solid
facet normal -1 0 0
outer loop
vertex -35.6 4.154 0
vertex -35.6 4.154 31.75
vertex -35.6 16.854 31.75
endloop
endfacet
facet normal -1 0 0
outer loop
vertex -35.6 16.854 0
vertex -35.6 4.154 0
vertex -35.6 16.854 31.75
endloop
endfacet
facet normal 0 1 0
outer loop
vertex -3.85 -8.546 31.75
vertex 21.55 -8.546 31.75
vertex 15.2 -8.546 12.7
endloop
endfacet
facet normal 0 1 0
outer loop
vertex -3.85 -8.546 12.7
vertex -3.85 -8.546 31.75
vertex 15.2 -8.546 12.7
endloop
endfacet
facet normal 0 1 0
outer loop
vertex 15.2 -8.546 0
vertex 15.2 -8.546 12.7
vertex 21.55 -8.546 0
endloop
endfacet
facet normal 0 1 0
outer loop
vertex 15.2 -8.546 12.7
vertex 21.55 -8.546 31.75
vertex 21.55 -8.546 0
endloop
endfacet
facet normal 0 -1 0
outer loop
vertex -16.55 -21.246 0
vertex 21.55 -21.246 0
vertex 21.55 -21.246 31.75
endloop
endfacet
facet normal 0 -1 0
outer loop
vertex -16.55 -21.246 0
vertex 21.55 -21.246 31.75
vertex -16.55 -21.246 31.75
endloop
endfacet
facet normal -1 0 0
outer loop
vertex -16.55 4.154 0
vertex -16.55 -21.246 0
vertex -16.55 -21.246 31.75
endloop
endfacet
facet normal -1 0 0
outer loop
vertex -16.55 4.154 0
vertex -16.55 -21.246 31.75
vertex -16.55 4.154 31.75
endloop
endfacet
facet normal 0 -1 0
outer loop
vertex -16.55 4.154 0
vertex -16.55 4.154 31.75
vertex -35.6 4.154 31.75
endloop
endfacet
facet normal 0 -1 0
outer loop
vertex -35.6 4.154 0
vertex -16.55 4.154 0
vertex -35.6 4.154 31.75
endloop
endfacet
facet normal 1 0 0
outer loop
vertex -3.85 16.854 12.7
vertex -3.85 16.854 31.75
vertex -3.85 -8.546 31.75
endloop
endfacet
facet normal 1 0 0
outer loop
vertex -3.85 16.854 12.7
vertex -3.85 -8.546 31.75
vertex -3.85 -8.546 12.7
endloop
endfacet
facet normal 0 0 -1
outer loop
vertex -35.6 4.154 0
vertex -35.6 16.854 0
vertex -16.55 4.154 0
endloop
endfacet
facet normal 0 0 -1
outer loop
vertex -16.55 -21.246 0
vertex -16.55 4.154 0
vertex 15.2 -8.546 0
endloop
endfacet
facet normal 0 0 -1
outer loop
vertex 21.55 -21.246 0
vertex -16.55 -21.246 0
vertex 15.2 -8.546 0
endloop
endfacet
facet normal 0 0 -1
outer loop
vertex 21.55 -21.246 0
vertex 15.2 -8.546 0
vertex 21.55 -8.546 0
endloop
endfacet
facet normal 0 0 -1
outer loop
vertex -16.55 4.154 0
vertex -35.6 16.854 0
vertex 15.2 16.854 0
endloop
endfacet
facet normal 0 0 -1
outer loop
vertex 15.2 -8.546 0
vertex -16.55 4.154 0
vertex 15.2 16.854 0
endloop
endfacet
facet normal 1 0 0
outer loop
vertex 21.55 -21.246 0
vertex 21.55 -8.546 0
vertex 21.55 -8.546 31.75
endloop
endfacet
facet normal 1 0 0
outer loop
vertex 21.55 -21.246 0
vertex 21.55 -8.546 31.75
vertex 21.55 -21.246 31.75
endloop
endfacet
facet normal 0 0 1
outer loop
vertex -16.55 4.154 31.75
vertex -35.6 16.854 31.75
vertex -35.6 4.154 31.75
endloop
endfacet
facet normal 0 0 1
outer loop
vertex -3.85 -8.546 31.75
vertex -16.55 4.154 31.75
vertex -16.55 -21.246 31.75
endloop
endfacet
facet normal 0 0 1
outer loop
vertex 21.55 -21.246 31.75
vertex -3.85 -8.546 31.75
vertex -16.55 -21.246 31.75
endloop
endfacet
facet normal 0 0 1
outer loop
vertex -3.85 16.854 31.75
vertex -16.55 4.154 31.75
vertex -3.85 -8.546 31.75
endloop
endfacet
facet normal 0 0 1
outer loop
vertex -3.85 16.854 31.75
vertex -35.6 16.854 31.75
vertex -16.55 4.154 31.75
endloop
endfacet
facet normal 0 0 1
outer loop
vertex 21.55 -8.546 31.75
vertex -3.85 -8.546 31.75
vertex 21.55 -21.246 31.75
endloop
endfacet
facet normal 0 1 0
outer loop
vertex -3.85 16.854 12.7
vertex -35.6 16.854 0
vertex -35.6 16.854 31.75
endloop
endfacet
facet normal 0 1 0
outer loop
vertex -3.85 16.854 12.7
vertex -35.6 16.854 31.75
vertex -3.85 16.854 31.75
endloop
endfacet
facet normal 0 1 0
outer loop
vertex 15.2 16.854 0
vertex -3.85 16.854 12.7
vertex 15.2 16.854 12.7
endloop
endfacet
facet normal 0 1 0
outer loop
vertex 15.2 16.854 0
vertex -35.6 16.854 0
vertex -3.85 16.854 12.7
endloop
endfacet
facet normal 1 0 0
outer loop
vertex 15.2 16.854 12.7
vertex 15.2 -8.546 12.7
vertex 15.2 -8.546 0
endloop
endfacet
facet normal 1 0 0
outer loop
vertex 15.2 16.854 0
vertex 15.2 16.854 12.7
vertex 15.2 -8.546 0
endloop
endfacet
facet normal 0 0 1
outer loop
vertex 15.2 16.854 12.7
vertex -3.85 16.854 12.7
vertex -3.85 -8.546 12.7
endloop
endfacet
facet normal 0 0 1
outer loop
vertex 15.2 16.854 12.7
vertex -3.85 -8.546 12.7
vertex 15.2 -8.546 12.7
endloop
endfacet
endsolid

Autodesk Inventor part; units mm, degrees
ref_plane "YZ Plane" through (0, 0, 0) normal (1, 0, 0) x (0, 1, 0)
ref_plane "XZ Plane" through (0, 0, 0) normal (0, 1, 0) x (-1, 0, 0)
ref_plane "XY Plane" through (0, 0, 0) normal (0, 0, 1) x (1, 0, 0)
sketch "Sketch1" plane through (0, 0, 0) normal (0, 0, 1) x (1, 0, 0)
  line L0 (-35.6004, 16.8538) -> (21.5496, 16.8538)
  line L1 (21.5496, 16.8538) -> (21.5496, -21.2462)
  line L2 (21.5496, -21.2462) -> (-35.6004, -21.2462)
  line L3 (-35.6004, -21.2462) -> (-35.6004, 16.8538)
  point P0 (0, 0)
  dimension "d0" = 57.15
  dimension "d1" = 38.1
extrude "Extrusion1" add sketch "Sketch1" along normal blind 31.75
sketch "Sketch2" plane through (21.5496, -21.2462, 0) normal (1, 0, 0) x (0, 0, -1)
  line L0 (0, 0) -> (0, 38.1) projected
  line L1 (0, 38.1) -> (-12.7, 38.1)
  line L2 (-12.7, 38.1) -> (-12.7, 12.7)
  line L3 (-12.7, 12.7) -> (0, 12.7)
  line L4 (0, 12.7) -> (0, 38.1)
  point P0 (0, 21.2462)
  dimension "d4" = 25.4
  dimension "d5" = 12.7
extrude "Extrusion2" cut sketch "Sketch2" against normal blind 6.35
sketch "Sketch3" plane through (-35.6004, 16.8538, 31.75) normal (0, 1, 0) x (1, 0, 0)
  line L0 (57.15, 31.75) -> (57.15, 0) projected
  line L1 (57.15, 0) -> (31.75, 0)
  line L2 (31.75, 0) -> (31.75, 19.05)
  line L3 (31.75, 19.05) -> (57.15, 19.05)
  line L4 (57.15, 19.05) -> (57.15, 0)
  point P0 (35.6004, 31.75)
  dimension "d8" = 19.05
  dimension "d9" = 25.4
extrude "Extrusion3" cut sketch "Sketch3" against normal blind 25.4
sketch "Sketch4" plane through (0, 0, 31.75) normal (0, 0, 1) x (1, 0, 0)
  line L0 (-35.6004, -21.2462) -> (-16.5504, -21.2462)
  line L1 (-16.5504, -21.2462) -> (-16.5504, 4.1538)
  line L2 (-16.5504, 4.1538) -> (-35.6004, 4.1538)
  line L3 (-35.6004, 4.1538) -> (-35.6004, -21.2462)
  point P0 (0, 0)
  dimension "d12" = 19.05
  dimension "d13" = 25.4
extrude "Extrusion4" cut sketch "Sketch4" against normal blind 50.8
properties part number "Figure 7_27_8"
